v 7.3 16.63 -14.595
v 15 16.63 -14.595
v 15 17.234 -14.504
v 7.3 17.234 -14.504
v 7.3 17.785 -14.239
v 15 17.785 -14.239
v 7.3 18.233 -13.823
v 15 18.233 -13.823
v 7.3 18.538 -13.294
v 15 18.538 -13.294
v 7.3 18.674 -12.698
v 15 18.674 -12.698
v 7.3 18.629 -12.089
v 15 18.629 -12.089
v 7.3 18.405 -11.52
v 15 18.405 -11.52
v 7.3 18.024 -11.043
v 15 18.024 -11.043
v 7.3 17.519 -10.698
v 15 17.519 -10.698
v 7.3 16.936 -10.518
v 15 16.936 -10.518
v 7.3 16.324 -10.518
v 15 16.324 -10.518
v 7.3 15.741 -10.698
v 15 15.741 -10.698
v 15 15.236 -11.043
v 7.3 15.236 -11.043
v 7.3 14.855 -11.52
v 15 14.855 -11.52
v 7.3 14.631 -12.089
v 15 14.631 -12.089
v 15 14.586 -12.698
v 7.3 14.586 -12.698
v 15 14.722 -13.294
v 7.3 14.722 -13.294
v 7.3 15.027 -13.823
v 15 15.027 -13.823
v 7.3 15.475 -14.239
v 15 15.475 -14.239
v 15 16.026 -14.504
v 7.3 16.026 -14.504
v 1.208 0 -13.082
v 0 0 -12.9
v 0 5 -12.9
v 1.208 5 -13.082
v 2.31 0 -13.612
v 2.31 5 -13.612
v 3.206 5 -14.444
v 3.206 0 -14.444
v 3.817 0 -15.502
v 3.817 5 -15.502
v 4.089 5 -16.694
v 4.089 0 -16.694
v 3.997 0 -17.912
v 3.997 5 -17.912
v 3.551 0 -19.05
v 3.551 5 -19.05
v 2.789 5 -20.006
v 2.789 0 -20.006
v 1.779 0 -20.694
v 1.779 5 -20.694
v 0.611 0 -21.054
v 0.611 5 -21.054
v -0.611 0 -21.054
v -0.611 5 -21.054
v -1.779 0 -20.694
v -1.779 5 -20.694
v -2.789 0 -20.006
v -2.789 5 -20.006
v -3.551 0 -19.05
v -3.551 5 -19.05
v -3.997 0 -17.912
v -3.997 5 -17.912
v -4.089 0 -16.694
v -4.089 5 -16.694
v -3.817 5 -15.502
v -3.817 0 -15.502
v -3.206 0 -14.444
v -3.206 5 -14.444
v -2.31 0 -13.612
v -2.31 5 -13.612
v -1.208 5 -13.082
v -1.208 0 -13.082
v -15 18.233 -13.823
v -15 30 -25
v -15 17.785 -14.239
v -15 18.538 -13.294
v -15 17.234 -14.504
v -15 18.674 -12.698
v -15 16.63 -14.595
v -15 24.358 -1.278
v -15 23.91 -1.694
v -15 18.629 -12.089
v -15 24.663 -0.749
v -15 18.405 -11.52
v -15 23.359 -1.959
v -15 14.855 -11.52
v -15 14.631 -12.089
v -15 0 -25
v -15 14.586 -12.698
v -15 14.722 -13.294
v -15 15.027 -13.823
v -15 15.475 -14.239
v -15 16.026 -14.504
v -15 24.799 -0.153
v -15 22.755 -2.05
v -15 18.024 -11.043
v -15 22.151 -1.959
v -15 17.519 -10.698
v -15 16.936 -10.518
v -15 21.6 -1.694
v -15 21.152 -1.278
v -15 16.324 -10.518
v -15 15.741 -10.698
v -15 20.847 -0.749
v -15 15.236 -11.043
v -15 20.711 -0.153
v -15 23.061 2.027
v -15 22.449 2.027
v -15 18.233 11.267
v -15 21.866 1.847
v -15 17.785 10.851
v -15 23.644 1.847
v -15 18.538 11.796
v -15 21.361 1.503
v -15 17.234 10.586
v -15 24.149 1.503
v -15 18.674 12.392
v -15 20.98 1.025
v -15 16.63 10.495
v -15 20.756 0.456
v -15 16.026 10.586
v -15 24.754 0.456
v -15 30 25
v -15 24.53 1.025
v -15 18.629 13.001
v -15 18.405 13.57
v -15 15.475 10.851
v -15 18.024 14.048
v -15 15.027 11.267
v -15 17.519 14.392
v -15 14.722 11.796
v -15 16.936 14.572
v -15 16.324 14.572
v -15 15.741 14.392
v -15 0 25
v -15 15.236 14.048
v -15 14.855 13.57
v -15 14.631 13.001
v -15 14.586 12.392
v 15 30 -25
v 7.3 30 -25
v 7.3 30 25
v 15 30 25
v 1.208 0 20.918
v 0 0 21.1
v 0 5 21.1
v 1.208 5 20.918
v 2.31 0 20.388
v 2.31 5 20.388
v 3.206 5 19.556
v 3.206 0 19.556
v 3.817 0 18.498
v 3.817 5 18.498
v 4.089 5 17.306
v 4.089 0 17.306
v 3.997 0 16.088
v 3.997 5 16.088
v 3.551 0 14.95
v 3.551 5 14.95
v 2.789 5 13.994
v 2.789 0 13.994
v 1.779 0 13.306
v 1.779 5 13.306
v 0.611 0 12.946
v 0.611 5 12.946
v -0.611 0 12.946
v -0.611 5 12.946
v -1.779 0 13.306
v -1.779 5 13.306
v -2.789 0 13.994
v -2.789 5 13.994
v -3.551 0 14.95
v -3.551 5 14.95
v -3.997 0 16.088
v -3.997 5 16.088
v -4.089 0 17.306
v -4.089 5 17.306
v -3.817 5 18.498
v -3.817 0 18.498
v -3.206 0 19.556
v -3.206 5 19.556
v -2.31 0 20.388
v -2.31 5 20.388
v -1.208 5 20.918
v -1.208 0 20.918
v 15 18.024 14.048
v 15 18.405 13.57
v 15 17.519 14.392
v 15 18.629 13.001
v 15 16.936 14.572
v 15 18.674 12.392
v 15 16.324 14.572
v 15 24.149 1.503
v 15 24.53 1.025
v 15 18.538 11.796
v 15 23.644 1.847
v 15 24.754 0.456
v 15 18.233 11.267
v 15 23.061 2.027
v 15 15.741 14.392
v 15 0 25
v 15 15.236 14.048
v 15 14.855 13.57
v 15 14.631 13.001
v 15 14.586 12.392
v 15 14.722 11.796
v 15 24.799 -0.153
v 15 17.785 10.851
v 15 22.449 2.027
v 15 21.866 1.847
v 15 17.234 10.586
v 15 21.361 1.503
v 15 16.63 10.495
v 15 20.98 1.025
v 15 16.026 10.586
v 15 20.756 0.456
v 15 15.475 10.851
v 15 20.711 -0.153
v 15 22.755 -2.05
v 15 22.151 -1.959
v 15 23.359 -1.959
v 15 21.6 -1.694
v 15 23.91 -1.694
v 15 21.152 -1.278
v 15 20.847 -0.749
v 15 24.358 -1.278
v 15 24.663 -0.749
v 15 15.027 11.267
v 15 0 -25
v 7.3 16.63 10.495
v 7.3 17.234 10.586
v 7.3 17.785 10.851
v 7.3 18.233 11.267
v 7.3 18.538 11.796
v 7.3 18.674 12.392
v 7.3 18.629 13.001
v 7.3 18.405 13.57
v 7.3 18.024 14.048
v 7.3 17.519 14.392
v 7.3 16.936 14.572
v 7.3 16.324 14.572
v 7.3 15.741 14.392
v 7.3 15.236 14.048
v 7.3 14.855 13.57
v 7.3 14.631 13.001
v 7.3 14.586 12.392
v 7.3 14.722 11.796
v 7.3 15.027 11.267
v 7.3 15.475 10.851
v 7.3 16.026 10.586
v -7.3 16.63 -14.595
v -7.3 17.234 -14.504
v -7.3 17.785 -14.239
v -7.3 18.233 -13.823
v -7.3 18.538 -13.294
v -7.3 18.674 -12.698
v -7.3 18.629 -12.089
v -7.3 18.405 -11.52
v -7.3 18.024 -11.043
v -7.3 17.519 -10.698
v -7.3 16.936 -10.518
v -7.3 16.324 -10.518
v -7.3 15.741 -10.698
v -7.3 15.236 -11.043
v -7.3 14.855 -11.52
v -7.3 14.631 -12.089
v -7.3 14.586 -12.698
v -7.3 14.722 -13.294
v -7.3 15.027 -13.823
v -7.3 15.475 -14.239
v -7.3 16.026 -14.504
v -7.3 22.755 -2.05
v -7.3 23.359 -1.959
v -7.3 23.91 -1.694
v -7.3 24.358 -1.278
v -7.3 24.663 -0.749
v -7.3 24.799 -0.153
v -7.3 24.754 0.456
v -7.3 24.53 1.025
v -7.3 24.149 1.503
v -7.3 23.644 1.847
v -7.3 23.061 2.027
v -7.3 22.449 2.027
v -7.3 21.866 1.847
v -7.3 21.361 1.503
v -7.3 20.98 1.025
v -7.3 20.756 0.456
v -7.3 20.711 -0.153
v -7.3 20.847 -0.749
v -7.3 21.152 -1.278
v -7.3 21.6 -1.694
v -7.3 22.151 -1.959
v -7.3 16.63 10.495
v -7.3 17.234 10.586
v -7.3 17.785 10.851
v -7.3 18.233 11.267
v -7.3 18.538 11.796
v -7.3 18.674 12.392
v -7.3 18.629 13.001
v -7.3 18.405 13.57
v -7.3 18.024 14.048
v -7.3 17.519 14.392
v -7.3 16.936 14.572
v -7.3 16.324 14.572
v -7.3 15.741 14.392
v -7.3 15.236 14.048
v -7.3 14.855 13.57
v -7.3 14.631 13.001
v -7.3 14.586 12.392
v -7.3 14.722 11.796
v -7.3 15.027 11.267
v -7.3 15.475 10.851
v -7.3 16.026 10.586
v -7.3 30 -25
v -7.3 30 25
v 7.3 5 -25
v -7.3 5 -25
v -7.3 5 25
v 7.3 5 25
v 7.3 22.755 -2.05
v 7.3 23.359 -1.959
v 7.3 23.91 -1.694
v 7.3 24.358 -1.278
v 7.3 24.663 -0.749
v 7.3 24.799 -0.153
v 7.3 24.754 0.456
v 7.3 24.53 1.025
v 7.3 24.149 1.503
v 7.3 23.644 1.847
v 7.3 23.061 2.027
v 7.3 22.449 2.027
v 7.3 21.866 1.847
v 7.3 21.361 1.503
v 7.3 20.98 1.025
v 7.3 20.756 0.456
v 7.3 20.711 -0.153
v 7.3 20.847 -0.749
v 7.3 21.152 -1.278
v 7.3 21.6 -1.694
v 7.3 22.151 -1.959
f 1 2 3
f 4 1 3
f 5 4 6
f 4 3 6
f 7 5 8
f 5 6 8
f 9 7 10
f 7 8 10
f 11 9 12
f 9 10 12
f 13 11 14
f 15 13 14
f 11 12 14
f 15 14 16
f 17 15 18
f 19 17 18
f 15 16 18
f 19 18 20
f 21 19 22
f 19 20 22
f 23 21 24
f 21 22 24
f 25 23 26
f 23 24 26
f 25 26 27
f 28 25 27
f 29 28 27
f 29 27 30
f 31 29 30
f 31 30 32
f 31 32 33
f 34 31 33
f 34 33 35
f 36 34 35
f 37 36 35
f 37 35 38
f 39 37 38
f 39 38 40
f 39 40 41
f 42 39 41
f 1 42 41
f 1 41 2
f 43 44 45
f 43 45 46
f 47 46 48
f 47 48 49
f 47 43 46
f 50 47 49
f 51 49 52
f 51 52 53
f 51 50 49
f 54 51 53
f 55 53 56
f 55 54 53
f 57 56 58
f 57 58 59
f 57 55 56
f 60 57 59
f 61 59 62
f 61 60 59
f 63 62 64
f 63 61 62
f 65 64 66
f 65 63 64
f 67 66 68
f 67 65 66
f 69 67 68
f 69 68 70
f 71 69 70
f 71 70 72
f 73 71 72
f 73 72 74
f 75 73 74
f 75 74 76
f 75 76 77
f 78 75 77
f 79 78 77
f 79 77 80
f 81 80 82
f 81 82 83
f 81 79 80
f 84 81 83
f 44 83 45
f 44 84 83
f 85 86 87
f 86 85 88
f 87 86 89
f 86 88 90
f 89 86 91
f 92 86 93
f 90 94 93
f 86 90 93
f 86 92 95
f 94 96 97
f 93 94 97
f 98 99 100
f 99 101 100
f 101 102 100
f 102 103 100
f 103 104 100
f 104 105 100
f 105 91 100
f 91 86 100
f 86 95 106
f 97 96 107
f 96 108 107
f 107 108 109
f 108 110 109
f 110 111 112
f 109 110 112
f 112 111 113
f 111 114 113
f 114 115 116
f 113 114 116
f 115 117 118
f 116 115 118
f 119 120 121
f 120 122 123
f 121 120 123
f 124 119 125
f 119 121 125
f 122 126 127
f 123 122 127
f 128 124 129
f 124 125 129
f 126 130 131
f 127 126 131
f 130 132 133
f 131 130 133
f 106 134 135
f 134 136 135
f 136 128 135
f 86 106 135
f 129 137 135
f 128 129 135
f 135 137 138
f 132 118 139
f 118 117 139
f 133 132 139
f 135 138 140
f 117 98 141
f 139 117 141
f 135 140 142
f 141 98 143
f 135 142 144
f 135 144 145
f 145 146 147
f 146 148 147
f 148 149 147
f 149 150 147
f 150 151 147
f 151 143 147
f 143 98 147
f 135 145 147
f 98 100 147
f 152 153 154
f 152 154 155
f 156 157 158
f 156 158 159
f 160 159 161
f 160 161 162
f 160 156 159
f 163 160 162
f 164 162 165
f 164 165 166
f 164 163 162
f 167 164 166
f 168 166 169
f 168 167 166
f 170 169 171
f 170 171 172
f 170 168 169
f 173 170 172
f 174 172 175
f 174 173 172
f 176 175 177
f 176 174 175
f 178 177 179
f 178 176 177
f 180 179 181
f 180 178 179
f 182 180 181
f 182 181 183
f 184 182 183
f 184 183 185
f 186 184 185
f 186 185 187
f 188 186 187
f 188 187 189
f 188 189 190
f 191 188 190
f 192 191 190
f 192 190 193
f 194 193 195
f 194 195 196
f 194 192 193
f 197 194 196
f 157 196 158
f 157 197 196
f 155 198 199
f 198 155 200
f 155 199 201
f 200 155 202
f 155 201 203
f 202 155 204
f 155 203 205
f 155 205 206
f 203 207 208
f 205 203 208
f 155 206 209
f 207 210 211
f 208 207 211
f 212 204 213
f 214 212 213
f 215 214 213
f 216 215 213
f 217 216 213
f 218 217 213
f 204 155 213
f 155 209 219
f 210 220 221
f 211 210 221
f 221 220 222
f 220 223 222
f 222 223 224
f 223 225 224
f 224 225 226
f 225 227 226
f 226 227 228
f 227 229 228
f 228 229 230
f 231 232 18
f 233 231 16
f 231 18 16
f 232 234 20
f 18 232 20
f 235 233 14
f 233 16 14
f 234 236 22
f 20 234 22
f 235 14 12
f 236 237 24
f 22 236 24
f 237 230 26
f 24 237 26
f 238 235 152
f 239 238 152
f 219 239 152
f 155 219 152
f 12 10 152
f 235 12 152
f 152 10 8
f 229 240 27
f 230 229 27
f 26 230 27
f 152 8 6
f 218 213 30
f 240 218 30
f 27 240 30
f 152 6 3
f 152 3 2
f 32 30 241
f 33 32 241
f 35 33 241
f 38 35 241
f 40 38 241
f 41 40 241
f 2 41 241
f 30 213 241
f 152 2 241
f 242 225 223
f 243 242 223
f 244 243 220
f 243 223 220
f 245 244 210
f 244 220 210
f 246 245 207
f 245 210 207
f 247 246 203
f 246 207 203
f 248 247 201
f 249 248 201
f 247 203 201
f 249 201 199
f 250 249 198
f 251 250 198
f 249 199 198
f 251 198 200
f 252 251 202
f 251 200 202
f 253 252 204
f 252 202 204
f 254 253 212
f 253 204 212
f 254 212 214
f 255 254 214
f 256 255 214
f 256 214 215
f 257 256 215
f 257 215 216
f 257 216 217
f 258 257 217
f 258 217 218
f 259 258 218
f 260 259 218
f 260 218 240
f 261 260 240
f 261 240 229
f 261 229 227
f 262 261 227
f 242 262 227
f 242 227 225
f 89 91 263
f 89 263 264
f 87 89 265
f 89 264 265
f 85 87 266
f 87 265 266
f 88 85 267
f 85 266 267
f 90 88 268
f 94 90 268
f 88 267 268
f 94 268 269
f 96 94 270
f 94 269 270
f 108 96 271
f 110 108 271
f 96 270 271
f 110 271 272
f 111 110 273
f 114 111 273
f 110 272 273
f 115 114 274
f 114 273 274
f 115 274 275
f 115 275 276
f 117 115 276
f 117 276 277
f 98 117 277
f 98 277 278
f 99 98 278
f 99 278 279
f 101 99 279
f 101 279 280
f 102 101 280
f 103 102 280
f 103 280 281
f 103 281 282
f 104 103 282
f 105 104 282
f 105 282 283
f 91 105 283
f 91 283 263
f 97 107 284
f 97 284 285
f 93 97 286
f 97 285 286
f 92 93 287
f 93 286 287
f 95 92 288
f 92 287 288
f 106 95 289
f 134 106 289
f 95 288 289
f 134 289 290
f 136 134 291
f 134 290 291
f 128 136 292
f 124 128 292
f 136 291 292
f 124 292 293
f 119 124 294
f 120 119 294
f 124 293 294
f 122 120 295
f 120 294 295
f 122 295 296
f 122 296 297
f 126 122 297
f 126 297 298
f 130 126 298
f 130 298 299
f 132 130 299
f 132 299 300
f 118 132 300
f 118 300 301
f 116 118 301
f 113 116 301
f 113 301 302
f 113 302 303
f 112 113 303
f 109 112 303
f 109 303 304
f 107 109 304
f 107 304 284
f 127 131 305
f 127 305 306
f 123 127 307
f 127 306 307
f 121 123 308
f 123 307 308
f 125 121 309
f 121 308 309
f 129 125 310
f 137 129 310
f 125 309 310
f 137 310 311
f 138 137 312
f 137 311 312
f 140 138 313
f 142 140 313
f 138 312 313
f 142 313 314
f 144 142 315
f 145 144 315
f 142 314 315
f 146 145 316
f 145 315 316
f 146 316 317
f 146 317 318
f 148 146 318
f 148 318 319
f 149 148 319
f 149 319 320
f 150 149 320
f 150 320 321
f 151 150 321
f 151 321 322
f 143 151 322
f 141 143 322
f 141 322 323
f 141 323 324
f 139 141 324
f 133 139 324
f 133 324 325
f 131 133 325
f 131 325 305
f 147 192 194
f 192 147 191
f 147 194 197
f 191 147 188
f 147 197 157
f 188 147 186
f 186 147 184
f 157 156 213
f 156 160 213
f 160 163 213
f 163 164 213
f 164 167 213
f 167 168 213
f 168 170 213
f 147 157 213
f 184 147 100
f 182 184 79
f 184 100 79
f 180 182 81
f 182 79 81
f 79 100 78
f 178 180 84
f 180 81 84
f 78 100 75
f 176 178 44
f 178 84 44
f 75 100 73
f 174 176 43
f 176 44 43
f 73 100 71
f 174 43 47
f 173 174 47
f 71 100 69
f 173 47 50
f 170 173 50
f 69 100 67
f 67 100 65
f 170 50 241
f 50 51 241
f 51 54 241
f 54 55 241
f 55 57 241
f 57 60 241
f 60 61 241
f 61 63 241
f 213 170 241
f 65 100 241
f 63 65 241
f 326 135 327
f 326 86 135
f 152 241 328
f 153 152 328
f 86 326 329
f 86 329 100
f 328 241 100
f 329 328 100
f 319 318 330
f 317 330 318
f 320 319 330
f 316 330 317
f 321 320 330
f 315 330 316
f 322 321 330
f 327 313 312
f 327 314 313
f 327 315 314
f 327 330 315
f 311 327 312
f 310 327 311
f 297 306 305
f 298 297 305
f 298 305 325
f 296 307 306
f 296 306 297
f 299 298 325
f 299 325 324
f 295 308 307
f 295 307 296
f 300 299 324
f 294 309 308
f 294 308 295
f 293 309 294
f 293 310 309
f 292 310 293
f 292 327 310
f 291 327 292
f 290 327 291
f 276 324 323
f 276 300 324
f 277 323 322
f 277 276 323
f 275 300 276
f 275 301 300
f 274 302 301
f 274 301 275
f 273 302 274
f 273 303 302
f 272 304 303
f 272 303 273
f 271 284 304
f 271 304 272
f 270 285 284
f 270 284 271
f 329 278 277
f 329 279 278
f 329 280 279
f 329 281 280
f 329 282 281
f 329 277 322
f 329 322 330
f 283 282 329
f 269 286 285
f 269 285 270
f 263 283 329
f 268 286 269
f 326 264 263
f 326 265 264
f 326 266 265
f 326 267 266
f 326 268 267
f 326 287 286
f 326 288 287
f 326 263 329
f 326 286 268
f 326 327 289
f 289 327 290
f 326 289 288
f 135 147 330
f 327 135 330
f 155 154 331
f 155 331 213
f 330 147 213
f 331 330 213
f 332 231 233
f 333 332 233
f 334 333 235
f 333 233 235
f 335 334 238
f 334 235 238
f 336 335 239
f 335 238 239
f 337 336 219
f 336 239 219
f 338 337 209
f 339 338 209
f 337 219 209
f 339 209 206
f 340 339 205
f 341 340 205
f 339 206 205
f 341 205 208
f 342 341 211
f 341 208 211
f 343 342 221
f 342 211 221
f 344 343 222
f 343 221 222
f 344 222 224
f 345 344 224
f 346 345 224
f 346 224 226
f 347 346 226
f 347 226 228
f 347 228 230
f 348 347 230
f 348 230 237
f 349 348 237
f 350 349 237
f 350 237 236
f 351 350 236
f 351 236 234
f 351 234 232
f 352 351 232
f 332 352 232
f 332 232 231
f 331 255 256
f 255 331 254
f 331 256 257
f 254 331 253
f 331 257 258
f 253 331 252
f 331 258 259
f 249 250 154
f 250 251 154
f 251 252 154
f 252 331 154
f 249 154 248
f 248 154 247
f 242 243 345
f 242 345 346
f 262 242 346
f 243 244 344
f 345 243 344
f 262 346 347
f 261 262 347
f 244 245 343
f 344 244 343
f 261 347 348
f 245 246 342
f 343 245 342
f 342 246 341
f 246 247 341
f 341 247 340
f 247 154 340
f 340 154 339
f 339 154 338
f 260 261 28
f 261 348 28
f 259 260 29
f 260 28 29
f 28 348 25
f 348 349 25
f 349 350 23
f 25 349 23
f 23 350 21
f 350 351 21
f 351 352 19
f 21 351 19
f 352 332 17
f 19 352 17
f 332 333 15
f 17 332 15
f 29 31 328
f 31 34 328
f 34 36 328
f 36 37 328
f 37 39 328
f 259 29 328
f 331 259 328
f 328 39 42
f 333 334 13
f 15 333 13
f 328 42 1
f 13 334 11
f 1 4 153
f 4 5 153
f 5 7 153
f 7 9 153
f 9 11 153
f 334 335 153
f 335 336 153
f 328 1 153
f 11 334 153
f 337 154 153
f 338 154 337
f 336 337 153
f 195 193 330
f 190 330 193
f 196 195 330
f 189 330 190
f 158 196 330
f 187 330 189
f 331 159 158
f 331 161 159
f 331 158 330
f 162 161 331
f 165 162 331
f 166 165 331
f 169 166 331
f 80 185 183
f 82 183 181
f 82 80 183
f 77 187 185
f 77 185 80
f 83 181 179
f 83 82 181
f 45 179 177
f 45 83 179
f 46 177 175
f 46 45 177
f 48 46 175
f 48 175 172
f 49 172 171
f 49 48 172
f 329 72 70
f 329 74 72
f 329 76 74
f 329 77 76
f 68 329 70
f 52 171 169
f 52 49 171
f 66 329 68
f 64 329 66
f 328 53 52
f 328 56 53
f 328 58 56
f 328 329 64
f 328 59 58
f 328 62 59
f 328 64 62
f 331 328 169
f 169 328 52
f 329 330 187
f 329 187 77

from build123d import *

# Parameters (mm, degrees)
SKETCH1_W           = 30
SKETCH1_H           = 50
SKETCH1_R           = 4.1
BOSS_EXTRUDE1_DEPTH = 5
BOSS_EXTRUDE2_DEPTH = 25
SKETCH4_R           = 2.05
CUT_EXTRUDE1_DEPTH  = 50.244289009
SKETCH5_W           = 14.6
SKETCH5_H           = 50
CUT_EXTRUDE2_DEPTH  = 25


with BuildPart() as part:
    # Sketch1 → Boss-Extrude1 (new body)
    with BuildSketch(Plane(origin=(0, 0, 0), x_dir=(1, 0, 0), z_dir=(0, 1, 0))):
        Rectangle(SKETCH1_W, SKETCH1_H)
        with Locations(Location((0, 17, 0), (0, 0, 270))):
            Circle(SKETCH1_R, mode=Mode.SUBTRACT)
        with Locations(Location((0, -17, 0), (0, 0, 270))):
            Circle(SKETCH1_R, mode=Mode.SUBTRACT)
    extrude(amount=BOSS_EXTRUDE1_DEPTH)

    # Sketch2 → Boss-Extrude2 (add)
    with BuildSketch(Plane(origin=(0, 5, 0), x_dir=(1, 0, 0), z_dir=(0, 1, 0))):
        Polygon((-7.25, -9.75), (7.25, -9.75), (7.25, -25), (15, -25), (15, 25), (7.25, 25), (7.25, 9.75), (-7.25, 9.75), (-7.25, 25), (-15, 25), (-15, -25), (-7.25, -25), align=None)
    extrude(amount=BOSS_EXTRUDE2_DEPTH)

    # Sketch4 → Cut-Extrude1 (cut, through all)
    with BuildSketch(Plane(origin=(15, 0, 0), x_dir=(0, 0, -1), z_dir=(1, 0, 0))):
        with Locations((-12.54526483, 16.63)):
            Circle(SKETCH4_R)
        with Locations((12.54526483, 16.63)):
            Circle(SKETCH4_R)
        with Locations((0, 22.755)):
            Circle(SKETCH4_R)
    extrude(amount=-CUT_EXTRUDE1_DEPTH, mode=Mode.SUBTRACT)

    # Sketch5 → Cut-Extrude2 (cut)
    with BuildSketch(Plane(origin=(0, 30, 0), x_dir=(1, 0, 0), z_dir=(0, 1, 0))):
        Rectangle(SKETCH5_W, SKETCH5_H)
    extrude(amount=-CUT_EXTRUDE2_DEPTH, mode=Mode.SUBTRACT)


solid = part.part
